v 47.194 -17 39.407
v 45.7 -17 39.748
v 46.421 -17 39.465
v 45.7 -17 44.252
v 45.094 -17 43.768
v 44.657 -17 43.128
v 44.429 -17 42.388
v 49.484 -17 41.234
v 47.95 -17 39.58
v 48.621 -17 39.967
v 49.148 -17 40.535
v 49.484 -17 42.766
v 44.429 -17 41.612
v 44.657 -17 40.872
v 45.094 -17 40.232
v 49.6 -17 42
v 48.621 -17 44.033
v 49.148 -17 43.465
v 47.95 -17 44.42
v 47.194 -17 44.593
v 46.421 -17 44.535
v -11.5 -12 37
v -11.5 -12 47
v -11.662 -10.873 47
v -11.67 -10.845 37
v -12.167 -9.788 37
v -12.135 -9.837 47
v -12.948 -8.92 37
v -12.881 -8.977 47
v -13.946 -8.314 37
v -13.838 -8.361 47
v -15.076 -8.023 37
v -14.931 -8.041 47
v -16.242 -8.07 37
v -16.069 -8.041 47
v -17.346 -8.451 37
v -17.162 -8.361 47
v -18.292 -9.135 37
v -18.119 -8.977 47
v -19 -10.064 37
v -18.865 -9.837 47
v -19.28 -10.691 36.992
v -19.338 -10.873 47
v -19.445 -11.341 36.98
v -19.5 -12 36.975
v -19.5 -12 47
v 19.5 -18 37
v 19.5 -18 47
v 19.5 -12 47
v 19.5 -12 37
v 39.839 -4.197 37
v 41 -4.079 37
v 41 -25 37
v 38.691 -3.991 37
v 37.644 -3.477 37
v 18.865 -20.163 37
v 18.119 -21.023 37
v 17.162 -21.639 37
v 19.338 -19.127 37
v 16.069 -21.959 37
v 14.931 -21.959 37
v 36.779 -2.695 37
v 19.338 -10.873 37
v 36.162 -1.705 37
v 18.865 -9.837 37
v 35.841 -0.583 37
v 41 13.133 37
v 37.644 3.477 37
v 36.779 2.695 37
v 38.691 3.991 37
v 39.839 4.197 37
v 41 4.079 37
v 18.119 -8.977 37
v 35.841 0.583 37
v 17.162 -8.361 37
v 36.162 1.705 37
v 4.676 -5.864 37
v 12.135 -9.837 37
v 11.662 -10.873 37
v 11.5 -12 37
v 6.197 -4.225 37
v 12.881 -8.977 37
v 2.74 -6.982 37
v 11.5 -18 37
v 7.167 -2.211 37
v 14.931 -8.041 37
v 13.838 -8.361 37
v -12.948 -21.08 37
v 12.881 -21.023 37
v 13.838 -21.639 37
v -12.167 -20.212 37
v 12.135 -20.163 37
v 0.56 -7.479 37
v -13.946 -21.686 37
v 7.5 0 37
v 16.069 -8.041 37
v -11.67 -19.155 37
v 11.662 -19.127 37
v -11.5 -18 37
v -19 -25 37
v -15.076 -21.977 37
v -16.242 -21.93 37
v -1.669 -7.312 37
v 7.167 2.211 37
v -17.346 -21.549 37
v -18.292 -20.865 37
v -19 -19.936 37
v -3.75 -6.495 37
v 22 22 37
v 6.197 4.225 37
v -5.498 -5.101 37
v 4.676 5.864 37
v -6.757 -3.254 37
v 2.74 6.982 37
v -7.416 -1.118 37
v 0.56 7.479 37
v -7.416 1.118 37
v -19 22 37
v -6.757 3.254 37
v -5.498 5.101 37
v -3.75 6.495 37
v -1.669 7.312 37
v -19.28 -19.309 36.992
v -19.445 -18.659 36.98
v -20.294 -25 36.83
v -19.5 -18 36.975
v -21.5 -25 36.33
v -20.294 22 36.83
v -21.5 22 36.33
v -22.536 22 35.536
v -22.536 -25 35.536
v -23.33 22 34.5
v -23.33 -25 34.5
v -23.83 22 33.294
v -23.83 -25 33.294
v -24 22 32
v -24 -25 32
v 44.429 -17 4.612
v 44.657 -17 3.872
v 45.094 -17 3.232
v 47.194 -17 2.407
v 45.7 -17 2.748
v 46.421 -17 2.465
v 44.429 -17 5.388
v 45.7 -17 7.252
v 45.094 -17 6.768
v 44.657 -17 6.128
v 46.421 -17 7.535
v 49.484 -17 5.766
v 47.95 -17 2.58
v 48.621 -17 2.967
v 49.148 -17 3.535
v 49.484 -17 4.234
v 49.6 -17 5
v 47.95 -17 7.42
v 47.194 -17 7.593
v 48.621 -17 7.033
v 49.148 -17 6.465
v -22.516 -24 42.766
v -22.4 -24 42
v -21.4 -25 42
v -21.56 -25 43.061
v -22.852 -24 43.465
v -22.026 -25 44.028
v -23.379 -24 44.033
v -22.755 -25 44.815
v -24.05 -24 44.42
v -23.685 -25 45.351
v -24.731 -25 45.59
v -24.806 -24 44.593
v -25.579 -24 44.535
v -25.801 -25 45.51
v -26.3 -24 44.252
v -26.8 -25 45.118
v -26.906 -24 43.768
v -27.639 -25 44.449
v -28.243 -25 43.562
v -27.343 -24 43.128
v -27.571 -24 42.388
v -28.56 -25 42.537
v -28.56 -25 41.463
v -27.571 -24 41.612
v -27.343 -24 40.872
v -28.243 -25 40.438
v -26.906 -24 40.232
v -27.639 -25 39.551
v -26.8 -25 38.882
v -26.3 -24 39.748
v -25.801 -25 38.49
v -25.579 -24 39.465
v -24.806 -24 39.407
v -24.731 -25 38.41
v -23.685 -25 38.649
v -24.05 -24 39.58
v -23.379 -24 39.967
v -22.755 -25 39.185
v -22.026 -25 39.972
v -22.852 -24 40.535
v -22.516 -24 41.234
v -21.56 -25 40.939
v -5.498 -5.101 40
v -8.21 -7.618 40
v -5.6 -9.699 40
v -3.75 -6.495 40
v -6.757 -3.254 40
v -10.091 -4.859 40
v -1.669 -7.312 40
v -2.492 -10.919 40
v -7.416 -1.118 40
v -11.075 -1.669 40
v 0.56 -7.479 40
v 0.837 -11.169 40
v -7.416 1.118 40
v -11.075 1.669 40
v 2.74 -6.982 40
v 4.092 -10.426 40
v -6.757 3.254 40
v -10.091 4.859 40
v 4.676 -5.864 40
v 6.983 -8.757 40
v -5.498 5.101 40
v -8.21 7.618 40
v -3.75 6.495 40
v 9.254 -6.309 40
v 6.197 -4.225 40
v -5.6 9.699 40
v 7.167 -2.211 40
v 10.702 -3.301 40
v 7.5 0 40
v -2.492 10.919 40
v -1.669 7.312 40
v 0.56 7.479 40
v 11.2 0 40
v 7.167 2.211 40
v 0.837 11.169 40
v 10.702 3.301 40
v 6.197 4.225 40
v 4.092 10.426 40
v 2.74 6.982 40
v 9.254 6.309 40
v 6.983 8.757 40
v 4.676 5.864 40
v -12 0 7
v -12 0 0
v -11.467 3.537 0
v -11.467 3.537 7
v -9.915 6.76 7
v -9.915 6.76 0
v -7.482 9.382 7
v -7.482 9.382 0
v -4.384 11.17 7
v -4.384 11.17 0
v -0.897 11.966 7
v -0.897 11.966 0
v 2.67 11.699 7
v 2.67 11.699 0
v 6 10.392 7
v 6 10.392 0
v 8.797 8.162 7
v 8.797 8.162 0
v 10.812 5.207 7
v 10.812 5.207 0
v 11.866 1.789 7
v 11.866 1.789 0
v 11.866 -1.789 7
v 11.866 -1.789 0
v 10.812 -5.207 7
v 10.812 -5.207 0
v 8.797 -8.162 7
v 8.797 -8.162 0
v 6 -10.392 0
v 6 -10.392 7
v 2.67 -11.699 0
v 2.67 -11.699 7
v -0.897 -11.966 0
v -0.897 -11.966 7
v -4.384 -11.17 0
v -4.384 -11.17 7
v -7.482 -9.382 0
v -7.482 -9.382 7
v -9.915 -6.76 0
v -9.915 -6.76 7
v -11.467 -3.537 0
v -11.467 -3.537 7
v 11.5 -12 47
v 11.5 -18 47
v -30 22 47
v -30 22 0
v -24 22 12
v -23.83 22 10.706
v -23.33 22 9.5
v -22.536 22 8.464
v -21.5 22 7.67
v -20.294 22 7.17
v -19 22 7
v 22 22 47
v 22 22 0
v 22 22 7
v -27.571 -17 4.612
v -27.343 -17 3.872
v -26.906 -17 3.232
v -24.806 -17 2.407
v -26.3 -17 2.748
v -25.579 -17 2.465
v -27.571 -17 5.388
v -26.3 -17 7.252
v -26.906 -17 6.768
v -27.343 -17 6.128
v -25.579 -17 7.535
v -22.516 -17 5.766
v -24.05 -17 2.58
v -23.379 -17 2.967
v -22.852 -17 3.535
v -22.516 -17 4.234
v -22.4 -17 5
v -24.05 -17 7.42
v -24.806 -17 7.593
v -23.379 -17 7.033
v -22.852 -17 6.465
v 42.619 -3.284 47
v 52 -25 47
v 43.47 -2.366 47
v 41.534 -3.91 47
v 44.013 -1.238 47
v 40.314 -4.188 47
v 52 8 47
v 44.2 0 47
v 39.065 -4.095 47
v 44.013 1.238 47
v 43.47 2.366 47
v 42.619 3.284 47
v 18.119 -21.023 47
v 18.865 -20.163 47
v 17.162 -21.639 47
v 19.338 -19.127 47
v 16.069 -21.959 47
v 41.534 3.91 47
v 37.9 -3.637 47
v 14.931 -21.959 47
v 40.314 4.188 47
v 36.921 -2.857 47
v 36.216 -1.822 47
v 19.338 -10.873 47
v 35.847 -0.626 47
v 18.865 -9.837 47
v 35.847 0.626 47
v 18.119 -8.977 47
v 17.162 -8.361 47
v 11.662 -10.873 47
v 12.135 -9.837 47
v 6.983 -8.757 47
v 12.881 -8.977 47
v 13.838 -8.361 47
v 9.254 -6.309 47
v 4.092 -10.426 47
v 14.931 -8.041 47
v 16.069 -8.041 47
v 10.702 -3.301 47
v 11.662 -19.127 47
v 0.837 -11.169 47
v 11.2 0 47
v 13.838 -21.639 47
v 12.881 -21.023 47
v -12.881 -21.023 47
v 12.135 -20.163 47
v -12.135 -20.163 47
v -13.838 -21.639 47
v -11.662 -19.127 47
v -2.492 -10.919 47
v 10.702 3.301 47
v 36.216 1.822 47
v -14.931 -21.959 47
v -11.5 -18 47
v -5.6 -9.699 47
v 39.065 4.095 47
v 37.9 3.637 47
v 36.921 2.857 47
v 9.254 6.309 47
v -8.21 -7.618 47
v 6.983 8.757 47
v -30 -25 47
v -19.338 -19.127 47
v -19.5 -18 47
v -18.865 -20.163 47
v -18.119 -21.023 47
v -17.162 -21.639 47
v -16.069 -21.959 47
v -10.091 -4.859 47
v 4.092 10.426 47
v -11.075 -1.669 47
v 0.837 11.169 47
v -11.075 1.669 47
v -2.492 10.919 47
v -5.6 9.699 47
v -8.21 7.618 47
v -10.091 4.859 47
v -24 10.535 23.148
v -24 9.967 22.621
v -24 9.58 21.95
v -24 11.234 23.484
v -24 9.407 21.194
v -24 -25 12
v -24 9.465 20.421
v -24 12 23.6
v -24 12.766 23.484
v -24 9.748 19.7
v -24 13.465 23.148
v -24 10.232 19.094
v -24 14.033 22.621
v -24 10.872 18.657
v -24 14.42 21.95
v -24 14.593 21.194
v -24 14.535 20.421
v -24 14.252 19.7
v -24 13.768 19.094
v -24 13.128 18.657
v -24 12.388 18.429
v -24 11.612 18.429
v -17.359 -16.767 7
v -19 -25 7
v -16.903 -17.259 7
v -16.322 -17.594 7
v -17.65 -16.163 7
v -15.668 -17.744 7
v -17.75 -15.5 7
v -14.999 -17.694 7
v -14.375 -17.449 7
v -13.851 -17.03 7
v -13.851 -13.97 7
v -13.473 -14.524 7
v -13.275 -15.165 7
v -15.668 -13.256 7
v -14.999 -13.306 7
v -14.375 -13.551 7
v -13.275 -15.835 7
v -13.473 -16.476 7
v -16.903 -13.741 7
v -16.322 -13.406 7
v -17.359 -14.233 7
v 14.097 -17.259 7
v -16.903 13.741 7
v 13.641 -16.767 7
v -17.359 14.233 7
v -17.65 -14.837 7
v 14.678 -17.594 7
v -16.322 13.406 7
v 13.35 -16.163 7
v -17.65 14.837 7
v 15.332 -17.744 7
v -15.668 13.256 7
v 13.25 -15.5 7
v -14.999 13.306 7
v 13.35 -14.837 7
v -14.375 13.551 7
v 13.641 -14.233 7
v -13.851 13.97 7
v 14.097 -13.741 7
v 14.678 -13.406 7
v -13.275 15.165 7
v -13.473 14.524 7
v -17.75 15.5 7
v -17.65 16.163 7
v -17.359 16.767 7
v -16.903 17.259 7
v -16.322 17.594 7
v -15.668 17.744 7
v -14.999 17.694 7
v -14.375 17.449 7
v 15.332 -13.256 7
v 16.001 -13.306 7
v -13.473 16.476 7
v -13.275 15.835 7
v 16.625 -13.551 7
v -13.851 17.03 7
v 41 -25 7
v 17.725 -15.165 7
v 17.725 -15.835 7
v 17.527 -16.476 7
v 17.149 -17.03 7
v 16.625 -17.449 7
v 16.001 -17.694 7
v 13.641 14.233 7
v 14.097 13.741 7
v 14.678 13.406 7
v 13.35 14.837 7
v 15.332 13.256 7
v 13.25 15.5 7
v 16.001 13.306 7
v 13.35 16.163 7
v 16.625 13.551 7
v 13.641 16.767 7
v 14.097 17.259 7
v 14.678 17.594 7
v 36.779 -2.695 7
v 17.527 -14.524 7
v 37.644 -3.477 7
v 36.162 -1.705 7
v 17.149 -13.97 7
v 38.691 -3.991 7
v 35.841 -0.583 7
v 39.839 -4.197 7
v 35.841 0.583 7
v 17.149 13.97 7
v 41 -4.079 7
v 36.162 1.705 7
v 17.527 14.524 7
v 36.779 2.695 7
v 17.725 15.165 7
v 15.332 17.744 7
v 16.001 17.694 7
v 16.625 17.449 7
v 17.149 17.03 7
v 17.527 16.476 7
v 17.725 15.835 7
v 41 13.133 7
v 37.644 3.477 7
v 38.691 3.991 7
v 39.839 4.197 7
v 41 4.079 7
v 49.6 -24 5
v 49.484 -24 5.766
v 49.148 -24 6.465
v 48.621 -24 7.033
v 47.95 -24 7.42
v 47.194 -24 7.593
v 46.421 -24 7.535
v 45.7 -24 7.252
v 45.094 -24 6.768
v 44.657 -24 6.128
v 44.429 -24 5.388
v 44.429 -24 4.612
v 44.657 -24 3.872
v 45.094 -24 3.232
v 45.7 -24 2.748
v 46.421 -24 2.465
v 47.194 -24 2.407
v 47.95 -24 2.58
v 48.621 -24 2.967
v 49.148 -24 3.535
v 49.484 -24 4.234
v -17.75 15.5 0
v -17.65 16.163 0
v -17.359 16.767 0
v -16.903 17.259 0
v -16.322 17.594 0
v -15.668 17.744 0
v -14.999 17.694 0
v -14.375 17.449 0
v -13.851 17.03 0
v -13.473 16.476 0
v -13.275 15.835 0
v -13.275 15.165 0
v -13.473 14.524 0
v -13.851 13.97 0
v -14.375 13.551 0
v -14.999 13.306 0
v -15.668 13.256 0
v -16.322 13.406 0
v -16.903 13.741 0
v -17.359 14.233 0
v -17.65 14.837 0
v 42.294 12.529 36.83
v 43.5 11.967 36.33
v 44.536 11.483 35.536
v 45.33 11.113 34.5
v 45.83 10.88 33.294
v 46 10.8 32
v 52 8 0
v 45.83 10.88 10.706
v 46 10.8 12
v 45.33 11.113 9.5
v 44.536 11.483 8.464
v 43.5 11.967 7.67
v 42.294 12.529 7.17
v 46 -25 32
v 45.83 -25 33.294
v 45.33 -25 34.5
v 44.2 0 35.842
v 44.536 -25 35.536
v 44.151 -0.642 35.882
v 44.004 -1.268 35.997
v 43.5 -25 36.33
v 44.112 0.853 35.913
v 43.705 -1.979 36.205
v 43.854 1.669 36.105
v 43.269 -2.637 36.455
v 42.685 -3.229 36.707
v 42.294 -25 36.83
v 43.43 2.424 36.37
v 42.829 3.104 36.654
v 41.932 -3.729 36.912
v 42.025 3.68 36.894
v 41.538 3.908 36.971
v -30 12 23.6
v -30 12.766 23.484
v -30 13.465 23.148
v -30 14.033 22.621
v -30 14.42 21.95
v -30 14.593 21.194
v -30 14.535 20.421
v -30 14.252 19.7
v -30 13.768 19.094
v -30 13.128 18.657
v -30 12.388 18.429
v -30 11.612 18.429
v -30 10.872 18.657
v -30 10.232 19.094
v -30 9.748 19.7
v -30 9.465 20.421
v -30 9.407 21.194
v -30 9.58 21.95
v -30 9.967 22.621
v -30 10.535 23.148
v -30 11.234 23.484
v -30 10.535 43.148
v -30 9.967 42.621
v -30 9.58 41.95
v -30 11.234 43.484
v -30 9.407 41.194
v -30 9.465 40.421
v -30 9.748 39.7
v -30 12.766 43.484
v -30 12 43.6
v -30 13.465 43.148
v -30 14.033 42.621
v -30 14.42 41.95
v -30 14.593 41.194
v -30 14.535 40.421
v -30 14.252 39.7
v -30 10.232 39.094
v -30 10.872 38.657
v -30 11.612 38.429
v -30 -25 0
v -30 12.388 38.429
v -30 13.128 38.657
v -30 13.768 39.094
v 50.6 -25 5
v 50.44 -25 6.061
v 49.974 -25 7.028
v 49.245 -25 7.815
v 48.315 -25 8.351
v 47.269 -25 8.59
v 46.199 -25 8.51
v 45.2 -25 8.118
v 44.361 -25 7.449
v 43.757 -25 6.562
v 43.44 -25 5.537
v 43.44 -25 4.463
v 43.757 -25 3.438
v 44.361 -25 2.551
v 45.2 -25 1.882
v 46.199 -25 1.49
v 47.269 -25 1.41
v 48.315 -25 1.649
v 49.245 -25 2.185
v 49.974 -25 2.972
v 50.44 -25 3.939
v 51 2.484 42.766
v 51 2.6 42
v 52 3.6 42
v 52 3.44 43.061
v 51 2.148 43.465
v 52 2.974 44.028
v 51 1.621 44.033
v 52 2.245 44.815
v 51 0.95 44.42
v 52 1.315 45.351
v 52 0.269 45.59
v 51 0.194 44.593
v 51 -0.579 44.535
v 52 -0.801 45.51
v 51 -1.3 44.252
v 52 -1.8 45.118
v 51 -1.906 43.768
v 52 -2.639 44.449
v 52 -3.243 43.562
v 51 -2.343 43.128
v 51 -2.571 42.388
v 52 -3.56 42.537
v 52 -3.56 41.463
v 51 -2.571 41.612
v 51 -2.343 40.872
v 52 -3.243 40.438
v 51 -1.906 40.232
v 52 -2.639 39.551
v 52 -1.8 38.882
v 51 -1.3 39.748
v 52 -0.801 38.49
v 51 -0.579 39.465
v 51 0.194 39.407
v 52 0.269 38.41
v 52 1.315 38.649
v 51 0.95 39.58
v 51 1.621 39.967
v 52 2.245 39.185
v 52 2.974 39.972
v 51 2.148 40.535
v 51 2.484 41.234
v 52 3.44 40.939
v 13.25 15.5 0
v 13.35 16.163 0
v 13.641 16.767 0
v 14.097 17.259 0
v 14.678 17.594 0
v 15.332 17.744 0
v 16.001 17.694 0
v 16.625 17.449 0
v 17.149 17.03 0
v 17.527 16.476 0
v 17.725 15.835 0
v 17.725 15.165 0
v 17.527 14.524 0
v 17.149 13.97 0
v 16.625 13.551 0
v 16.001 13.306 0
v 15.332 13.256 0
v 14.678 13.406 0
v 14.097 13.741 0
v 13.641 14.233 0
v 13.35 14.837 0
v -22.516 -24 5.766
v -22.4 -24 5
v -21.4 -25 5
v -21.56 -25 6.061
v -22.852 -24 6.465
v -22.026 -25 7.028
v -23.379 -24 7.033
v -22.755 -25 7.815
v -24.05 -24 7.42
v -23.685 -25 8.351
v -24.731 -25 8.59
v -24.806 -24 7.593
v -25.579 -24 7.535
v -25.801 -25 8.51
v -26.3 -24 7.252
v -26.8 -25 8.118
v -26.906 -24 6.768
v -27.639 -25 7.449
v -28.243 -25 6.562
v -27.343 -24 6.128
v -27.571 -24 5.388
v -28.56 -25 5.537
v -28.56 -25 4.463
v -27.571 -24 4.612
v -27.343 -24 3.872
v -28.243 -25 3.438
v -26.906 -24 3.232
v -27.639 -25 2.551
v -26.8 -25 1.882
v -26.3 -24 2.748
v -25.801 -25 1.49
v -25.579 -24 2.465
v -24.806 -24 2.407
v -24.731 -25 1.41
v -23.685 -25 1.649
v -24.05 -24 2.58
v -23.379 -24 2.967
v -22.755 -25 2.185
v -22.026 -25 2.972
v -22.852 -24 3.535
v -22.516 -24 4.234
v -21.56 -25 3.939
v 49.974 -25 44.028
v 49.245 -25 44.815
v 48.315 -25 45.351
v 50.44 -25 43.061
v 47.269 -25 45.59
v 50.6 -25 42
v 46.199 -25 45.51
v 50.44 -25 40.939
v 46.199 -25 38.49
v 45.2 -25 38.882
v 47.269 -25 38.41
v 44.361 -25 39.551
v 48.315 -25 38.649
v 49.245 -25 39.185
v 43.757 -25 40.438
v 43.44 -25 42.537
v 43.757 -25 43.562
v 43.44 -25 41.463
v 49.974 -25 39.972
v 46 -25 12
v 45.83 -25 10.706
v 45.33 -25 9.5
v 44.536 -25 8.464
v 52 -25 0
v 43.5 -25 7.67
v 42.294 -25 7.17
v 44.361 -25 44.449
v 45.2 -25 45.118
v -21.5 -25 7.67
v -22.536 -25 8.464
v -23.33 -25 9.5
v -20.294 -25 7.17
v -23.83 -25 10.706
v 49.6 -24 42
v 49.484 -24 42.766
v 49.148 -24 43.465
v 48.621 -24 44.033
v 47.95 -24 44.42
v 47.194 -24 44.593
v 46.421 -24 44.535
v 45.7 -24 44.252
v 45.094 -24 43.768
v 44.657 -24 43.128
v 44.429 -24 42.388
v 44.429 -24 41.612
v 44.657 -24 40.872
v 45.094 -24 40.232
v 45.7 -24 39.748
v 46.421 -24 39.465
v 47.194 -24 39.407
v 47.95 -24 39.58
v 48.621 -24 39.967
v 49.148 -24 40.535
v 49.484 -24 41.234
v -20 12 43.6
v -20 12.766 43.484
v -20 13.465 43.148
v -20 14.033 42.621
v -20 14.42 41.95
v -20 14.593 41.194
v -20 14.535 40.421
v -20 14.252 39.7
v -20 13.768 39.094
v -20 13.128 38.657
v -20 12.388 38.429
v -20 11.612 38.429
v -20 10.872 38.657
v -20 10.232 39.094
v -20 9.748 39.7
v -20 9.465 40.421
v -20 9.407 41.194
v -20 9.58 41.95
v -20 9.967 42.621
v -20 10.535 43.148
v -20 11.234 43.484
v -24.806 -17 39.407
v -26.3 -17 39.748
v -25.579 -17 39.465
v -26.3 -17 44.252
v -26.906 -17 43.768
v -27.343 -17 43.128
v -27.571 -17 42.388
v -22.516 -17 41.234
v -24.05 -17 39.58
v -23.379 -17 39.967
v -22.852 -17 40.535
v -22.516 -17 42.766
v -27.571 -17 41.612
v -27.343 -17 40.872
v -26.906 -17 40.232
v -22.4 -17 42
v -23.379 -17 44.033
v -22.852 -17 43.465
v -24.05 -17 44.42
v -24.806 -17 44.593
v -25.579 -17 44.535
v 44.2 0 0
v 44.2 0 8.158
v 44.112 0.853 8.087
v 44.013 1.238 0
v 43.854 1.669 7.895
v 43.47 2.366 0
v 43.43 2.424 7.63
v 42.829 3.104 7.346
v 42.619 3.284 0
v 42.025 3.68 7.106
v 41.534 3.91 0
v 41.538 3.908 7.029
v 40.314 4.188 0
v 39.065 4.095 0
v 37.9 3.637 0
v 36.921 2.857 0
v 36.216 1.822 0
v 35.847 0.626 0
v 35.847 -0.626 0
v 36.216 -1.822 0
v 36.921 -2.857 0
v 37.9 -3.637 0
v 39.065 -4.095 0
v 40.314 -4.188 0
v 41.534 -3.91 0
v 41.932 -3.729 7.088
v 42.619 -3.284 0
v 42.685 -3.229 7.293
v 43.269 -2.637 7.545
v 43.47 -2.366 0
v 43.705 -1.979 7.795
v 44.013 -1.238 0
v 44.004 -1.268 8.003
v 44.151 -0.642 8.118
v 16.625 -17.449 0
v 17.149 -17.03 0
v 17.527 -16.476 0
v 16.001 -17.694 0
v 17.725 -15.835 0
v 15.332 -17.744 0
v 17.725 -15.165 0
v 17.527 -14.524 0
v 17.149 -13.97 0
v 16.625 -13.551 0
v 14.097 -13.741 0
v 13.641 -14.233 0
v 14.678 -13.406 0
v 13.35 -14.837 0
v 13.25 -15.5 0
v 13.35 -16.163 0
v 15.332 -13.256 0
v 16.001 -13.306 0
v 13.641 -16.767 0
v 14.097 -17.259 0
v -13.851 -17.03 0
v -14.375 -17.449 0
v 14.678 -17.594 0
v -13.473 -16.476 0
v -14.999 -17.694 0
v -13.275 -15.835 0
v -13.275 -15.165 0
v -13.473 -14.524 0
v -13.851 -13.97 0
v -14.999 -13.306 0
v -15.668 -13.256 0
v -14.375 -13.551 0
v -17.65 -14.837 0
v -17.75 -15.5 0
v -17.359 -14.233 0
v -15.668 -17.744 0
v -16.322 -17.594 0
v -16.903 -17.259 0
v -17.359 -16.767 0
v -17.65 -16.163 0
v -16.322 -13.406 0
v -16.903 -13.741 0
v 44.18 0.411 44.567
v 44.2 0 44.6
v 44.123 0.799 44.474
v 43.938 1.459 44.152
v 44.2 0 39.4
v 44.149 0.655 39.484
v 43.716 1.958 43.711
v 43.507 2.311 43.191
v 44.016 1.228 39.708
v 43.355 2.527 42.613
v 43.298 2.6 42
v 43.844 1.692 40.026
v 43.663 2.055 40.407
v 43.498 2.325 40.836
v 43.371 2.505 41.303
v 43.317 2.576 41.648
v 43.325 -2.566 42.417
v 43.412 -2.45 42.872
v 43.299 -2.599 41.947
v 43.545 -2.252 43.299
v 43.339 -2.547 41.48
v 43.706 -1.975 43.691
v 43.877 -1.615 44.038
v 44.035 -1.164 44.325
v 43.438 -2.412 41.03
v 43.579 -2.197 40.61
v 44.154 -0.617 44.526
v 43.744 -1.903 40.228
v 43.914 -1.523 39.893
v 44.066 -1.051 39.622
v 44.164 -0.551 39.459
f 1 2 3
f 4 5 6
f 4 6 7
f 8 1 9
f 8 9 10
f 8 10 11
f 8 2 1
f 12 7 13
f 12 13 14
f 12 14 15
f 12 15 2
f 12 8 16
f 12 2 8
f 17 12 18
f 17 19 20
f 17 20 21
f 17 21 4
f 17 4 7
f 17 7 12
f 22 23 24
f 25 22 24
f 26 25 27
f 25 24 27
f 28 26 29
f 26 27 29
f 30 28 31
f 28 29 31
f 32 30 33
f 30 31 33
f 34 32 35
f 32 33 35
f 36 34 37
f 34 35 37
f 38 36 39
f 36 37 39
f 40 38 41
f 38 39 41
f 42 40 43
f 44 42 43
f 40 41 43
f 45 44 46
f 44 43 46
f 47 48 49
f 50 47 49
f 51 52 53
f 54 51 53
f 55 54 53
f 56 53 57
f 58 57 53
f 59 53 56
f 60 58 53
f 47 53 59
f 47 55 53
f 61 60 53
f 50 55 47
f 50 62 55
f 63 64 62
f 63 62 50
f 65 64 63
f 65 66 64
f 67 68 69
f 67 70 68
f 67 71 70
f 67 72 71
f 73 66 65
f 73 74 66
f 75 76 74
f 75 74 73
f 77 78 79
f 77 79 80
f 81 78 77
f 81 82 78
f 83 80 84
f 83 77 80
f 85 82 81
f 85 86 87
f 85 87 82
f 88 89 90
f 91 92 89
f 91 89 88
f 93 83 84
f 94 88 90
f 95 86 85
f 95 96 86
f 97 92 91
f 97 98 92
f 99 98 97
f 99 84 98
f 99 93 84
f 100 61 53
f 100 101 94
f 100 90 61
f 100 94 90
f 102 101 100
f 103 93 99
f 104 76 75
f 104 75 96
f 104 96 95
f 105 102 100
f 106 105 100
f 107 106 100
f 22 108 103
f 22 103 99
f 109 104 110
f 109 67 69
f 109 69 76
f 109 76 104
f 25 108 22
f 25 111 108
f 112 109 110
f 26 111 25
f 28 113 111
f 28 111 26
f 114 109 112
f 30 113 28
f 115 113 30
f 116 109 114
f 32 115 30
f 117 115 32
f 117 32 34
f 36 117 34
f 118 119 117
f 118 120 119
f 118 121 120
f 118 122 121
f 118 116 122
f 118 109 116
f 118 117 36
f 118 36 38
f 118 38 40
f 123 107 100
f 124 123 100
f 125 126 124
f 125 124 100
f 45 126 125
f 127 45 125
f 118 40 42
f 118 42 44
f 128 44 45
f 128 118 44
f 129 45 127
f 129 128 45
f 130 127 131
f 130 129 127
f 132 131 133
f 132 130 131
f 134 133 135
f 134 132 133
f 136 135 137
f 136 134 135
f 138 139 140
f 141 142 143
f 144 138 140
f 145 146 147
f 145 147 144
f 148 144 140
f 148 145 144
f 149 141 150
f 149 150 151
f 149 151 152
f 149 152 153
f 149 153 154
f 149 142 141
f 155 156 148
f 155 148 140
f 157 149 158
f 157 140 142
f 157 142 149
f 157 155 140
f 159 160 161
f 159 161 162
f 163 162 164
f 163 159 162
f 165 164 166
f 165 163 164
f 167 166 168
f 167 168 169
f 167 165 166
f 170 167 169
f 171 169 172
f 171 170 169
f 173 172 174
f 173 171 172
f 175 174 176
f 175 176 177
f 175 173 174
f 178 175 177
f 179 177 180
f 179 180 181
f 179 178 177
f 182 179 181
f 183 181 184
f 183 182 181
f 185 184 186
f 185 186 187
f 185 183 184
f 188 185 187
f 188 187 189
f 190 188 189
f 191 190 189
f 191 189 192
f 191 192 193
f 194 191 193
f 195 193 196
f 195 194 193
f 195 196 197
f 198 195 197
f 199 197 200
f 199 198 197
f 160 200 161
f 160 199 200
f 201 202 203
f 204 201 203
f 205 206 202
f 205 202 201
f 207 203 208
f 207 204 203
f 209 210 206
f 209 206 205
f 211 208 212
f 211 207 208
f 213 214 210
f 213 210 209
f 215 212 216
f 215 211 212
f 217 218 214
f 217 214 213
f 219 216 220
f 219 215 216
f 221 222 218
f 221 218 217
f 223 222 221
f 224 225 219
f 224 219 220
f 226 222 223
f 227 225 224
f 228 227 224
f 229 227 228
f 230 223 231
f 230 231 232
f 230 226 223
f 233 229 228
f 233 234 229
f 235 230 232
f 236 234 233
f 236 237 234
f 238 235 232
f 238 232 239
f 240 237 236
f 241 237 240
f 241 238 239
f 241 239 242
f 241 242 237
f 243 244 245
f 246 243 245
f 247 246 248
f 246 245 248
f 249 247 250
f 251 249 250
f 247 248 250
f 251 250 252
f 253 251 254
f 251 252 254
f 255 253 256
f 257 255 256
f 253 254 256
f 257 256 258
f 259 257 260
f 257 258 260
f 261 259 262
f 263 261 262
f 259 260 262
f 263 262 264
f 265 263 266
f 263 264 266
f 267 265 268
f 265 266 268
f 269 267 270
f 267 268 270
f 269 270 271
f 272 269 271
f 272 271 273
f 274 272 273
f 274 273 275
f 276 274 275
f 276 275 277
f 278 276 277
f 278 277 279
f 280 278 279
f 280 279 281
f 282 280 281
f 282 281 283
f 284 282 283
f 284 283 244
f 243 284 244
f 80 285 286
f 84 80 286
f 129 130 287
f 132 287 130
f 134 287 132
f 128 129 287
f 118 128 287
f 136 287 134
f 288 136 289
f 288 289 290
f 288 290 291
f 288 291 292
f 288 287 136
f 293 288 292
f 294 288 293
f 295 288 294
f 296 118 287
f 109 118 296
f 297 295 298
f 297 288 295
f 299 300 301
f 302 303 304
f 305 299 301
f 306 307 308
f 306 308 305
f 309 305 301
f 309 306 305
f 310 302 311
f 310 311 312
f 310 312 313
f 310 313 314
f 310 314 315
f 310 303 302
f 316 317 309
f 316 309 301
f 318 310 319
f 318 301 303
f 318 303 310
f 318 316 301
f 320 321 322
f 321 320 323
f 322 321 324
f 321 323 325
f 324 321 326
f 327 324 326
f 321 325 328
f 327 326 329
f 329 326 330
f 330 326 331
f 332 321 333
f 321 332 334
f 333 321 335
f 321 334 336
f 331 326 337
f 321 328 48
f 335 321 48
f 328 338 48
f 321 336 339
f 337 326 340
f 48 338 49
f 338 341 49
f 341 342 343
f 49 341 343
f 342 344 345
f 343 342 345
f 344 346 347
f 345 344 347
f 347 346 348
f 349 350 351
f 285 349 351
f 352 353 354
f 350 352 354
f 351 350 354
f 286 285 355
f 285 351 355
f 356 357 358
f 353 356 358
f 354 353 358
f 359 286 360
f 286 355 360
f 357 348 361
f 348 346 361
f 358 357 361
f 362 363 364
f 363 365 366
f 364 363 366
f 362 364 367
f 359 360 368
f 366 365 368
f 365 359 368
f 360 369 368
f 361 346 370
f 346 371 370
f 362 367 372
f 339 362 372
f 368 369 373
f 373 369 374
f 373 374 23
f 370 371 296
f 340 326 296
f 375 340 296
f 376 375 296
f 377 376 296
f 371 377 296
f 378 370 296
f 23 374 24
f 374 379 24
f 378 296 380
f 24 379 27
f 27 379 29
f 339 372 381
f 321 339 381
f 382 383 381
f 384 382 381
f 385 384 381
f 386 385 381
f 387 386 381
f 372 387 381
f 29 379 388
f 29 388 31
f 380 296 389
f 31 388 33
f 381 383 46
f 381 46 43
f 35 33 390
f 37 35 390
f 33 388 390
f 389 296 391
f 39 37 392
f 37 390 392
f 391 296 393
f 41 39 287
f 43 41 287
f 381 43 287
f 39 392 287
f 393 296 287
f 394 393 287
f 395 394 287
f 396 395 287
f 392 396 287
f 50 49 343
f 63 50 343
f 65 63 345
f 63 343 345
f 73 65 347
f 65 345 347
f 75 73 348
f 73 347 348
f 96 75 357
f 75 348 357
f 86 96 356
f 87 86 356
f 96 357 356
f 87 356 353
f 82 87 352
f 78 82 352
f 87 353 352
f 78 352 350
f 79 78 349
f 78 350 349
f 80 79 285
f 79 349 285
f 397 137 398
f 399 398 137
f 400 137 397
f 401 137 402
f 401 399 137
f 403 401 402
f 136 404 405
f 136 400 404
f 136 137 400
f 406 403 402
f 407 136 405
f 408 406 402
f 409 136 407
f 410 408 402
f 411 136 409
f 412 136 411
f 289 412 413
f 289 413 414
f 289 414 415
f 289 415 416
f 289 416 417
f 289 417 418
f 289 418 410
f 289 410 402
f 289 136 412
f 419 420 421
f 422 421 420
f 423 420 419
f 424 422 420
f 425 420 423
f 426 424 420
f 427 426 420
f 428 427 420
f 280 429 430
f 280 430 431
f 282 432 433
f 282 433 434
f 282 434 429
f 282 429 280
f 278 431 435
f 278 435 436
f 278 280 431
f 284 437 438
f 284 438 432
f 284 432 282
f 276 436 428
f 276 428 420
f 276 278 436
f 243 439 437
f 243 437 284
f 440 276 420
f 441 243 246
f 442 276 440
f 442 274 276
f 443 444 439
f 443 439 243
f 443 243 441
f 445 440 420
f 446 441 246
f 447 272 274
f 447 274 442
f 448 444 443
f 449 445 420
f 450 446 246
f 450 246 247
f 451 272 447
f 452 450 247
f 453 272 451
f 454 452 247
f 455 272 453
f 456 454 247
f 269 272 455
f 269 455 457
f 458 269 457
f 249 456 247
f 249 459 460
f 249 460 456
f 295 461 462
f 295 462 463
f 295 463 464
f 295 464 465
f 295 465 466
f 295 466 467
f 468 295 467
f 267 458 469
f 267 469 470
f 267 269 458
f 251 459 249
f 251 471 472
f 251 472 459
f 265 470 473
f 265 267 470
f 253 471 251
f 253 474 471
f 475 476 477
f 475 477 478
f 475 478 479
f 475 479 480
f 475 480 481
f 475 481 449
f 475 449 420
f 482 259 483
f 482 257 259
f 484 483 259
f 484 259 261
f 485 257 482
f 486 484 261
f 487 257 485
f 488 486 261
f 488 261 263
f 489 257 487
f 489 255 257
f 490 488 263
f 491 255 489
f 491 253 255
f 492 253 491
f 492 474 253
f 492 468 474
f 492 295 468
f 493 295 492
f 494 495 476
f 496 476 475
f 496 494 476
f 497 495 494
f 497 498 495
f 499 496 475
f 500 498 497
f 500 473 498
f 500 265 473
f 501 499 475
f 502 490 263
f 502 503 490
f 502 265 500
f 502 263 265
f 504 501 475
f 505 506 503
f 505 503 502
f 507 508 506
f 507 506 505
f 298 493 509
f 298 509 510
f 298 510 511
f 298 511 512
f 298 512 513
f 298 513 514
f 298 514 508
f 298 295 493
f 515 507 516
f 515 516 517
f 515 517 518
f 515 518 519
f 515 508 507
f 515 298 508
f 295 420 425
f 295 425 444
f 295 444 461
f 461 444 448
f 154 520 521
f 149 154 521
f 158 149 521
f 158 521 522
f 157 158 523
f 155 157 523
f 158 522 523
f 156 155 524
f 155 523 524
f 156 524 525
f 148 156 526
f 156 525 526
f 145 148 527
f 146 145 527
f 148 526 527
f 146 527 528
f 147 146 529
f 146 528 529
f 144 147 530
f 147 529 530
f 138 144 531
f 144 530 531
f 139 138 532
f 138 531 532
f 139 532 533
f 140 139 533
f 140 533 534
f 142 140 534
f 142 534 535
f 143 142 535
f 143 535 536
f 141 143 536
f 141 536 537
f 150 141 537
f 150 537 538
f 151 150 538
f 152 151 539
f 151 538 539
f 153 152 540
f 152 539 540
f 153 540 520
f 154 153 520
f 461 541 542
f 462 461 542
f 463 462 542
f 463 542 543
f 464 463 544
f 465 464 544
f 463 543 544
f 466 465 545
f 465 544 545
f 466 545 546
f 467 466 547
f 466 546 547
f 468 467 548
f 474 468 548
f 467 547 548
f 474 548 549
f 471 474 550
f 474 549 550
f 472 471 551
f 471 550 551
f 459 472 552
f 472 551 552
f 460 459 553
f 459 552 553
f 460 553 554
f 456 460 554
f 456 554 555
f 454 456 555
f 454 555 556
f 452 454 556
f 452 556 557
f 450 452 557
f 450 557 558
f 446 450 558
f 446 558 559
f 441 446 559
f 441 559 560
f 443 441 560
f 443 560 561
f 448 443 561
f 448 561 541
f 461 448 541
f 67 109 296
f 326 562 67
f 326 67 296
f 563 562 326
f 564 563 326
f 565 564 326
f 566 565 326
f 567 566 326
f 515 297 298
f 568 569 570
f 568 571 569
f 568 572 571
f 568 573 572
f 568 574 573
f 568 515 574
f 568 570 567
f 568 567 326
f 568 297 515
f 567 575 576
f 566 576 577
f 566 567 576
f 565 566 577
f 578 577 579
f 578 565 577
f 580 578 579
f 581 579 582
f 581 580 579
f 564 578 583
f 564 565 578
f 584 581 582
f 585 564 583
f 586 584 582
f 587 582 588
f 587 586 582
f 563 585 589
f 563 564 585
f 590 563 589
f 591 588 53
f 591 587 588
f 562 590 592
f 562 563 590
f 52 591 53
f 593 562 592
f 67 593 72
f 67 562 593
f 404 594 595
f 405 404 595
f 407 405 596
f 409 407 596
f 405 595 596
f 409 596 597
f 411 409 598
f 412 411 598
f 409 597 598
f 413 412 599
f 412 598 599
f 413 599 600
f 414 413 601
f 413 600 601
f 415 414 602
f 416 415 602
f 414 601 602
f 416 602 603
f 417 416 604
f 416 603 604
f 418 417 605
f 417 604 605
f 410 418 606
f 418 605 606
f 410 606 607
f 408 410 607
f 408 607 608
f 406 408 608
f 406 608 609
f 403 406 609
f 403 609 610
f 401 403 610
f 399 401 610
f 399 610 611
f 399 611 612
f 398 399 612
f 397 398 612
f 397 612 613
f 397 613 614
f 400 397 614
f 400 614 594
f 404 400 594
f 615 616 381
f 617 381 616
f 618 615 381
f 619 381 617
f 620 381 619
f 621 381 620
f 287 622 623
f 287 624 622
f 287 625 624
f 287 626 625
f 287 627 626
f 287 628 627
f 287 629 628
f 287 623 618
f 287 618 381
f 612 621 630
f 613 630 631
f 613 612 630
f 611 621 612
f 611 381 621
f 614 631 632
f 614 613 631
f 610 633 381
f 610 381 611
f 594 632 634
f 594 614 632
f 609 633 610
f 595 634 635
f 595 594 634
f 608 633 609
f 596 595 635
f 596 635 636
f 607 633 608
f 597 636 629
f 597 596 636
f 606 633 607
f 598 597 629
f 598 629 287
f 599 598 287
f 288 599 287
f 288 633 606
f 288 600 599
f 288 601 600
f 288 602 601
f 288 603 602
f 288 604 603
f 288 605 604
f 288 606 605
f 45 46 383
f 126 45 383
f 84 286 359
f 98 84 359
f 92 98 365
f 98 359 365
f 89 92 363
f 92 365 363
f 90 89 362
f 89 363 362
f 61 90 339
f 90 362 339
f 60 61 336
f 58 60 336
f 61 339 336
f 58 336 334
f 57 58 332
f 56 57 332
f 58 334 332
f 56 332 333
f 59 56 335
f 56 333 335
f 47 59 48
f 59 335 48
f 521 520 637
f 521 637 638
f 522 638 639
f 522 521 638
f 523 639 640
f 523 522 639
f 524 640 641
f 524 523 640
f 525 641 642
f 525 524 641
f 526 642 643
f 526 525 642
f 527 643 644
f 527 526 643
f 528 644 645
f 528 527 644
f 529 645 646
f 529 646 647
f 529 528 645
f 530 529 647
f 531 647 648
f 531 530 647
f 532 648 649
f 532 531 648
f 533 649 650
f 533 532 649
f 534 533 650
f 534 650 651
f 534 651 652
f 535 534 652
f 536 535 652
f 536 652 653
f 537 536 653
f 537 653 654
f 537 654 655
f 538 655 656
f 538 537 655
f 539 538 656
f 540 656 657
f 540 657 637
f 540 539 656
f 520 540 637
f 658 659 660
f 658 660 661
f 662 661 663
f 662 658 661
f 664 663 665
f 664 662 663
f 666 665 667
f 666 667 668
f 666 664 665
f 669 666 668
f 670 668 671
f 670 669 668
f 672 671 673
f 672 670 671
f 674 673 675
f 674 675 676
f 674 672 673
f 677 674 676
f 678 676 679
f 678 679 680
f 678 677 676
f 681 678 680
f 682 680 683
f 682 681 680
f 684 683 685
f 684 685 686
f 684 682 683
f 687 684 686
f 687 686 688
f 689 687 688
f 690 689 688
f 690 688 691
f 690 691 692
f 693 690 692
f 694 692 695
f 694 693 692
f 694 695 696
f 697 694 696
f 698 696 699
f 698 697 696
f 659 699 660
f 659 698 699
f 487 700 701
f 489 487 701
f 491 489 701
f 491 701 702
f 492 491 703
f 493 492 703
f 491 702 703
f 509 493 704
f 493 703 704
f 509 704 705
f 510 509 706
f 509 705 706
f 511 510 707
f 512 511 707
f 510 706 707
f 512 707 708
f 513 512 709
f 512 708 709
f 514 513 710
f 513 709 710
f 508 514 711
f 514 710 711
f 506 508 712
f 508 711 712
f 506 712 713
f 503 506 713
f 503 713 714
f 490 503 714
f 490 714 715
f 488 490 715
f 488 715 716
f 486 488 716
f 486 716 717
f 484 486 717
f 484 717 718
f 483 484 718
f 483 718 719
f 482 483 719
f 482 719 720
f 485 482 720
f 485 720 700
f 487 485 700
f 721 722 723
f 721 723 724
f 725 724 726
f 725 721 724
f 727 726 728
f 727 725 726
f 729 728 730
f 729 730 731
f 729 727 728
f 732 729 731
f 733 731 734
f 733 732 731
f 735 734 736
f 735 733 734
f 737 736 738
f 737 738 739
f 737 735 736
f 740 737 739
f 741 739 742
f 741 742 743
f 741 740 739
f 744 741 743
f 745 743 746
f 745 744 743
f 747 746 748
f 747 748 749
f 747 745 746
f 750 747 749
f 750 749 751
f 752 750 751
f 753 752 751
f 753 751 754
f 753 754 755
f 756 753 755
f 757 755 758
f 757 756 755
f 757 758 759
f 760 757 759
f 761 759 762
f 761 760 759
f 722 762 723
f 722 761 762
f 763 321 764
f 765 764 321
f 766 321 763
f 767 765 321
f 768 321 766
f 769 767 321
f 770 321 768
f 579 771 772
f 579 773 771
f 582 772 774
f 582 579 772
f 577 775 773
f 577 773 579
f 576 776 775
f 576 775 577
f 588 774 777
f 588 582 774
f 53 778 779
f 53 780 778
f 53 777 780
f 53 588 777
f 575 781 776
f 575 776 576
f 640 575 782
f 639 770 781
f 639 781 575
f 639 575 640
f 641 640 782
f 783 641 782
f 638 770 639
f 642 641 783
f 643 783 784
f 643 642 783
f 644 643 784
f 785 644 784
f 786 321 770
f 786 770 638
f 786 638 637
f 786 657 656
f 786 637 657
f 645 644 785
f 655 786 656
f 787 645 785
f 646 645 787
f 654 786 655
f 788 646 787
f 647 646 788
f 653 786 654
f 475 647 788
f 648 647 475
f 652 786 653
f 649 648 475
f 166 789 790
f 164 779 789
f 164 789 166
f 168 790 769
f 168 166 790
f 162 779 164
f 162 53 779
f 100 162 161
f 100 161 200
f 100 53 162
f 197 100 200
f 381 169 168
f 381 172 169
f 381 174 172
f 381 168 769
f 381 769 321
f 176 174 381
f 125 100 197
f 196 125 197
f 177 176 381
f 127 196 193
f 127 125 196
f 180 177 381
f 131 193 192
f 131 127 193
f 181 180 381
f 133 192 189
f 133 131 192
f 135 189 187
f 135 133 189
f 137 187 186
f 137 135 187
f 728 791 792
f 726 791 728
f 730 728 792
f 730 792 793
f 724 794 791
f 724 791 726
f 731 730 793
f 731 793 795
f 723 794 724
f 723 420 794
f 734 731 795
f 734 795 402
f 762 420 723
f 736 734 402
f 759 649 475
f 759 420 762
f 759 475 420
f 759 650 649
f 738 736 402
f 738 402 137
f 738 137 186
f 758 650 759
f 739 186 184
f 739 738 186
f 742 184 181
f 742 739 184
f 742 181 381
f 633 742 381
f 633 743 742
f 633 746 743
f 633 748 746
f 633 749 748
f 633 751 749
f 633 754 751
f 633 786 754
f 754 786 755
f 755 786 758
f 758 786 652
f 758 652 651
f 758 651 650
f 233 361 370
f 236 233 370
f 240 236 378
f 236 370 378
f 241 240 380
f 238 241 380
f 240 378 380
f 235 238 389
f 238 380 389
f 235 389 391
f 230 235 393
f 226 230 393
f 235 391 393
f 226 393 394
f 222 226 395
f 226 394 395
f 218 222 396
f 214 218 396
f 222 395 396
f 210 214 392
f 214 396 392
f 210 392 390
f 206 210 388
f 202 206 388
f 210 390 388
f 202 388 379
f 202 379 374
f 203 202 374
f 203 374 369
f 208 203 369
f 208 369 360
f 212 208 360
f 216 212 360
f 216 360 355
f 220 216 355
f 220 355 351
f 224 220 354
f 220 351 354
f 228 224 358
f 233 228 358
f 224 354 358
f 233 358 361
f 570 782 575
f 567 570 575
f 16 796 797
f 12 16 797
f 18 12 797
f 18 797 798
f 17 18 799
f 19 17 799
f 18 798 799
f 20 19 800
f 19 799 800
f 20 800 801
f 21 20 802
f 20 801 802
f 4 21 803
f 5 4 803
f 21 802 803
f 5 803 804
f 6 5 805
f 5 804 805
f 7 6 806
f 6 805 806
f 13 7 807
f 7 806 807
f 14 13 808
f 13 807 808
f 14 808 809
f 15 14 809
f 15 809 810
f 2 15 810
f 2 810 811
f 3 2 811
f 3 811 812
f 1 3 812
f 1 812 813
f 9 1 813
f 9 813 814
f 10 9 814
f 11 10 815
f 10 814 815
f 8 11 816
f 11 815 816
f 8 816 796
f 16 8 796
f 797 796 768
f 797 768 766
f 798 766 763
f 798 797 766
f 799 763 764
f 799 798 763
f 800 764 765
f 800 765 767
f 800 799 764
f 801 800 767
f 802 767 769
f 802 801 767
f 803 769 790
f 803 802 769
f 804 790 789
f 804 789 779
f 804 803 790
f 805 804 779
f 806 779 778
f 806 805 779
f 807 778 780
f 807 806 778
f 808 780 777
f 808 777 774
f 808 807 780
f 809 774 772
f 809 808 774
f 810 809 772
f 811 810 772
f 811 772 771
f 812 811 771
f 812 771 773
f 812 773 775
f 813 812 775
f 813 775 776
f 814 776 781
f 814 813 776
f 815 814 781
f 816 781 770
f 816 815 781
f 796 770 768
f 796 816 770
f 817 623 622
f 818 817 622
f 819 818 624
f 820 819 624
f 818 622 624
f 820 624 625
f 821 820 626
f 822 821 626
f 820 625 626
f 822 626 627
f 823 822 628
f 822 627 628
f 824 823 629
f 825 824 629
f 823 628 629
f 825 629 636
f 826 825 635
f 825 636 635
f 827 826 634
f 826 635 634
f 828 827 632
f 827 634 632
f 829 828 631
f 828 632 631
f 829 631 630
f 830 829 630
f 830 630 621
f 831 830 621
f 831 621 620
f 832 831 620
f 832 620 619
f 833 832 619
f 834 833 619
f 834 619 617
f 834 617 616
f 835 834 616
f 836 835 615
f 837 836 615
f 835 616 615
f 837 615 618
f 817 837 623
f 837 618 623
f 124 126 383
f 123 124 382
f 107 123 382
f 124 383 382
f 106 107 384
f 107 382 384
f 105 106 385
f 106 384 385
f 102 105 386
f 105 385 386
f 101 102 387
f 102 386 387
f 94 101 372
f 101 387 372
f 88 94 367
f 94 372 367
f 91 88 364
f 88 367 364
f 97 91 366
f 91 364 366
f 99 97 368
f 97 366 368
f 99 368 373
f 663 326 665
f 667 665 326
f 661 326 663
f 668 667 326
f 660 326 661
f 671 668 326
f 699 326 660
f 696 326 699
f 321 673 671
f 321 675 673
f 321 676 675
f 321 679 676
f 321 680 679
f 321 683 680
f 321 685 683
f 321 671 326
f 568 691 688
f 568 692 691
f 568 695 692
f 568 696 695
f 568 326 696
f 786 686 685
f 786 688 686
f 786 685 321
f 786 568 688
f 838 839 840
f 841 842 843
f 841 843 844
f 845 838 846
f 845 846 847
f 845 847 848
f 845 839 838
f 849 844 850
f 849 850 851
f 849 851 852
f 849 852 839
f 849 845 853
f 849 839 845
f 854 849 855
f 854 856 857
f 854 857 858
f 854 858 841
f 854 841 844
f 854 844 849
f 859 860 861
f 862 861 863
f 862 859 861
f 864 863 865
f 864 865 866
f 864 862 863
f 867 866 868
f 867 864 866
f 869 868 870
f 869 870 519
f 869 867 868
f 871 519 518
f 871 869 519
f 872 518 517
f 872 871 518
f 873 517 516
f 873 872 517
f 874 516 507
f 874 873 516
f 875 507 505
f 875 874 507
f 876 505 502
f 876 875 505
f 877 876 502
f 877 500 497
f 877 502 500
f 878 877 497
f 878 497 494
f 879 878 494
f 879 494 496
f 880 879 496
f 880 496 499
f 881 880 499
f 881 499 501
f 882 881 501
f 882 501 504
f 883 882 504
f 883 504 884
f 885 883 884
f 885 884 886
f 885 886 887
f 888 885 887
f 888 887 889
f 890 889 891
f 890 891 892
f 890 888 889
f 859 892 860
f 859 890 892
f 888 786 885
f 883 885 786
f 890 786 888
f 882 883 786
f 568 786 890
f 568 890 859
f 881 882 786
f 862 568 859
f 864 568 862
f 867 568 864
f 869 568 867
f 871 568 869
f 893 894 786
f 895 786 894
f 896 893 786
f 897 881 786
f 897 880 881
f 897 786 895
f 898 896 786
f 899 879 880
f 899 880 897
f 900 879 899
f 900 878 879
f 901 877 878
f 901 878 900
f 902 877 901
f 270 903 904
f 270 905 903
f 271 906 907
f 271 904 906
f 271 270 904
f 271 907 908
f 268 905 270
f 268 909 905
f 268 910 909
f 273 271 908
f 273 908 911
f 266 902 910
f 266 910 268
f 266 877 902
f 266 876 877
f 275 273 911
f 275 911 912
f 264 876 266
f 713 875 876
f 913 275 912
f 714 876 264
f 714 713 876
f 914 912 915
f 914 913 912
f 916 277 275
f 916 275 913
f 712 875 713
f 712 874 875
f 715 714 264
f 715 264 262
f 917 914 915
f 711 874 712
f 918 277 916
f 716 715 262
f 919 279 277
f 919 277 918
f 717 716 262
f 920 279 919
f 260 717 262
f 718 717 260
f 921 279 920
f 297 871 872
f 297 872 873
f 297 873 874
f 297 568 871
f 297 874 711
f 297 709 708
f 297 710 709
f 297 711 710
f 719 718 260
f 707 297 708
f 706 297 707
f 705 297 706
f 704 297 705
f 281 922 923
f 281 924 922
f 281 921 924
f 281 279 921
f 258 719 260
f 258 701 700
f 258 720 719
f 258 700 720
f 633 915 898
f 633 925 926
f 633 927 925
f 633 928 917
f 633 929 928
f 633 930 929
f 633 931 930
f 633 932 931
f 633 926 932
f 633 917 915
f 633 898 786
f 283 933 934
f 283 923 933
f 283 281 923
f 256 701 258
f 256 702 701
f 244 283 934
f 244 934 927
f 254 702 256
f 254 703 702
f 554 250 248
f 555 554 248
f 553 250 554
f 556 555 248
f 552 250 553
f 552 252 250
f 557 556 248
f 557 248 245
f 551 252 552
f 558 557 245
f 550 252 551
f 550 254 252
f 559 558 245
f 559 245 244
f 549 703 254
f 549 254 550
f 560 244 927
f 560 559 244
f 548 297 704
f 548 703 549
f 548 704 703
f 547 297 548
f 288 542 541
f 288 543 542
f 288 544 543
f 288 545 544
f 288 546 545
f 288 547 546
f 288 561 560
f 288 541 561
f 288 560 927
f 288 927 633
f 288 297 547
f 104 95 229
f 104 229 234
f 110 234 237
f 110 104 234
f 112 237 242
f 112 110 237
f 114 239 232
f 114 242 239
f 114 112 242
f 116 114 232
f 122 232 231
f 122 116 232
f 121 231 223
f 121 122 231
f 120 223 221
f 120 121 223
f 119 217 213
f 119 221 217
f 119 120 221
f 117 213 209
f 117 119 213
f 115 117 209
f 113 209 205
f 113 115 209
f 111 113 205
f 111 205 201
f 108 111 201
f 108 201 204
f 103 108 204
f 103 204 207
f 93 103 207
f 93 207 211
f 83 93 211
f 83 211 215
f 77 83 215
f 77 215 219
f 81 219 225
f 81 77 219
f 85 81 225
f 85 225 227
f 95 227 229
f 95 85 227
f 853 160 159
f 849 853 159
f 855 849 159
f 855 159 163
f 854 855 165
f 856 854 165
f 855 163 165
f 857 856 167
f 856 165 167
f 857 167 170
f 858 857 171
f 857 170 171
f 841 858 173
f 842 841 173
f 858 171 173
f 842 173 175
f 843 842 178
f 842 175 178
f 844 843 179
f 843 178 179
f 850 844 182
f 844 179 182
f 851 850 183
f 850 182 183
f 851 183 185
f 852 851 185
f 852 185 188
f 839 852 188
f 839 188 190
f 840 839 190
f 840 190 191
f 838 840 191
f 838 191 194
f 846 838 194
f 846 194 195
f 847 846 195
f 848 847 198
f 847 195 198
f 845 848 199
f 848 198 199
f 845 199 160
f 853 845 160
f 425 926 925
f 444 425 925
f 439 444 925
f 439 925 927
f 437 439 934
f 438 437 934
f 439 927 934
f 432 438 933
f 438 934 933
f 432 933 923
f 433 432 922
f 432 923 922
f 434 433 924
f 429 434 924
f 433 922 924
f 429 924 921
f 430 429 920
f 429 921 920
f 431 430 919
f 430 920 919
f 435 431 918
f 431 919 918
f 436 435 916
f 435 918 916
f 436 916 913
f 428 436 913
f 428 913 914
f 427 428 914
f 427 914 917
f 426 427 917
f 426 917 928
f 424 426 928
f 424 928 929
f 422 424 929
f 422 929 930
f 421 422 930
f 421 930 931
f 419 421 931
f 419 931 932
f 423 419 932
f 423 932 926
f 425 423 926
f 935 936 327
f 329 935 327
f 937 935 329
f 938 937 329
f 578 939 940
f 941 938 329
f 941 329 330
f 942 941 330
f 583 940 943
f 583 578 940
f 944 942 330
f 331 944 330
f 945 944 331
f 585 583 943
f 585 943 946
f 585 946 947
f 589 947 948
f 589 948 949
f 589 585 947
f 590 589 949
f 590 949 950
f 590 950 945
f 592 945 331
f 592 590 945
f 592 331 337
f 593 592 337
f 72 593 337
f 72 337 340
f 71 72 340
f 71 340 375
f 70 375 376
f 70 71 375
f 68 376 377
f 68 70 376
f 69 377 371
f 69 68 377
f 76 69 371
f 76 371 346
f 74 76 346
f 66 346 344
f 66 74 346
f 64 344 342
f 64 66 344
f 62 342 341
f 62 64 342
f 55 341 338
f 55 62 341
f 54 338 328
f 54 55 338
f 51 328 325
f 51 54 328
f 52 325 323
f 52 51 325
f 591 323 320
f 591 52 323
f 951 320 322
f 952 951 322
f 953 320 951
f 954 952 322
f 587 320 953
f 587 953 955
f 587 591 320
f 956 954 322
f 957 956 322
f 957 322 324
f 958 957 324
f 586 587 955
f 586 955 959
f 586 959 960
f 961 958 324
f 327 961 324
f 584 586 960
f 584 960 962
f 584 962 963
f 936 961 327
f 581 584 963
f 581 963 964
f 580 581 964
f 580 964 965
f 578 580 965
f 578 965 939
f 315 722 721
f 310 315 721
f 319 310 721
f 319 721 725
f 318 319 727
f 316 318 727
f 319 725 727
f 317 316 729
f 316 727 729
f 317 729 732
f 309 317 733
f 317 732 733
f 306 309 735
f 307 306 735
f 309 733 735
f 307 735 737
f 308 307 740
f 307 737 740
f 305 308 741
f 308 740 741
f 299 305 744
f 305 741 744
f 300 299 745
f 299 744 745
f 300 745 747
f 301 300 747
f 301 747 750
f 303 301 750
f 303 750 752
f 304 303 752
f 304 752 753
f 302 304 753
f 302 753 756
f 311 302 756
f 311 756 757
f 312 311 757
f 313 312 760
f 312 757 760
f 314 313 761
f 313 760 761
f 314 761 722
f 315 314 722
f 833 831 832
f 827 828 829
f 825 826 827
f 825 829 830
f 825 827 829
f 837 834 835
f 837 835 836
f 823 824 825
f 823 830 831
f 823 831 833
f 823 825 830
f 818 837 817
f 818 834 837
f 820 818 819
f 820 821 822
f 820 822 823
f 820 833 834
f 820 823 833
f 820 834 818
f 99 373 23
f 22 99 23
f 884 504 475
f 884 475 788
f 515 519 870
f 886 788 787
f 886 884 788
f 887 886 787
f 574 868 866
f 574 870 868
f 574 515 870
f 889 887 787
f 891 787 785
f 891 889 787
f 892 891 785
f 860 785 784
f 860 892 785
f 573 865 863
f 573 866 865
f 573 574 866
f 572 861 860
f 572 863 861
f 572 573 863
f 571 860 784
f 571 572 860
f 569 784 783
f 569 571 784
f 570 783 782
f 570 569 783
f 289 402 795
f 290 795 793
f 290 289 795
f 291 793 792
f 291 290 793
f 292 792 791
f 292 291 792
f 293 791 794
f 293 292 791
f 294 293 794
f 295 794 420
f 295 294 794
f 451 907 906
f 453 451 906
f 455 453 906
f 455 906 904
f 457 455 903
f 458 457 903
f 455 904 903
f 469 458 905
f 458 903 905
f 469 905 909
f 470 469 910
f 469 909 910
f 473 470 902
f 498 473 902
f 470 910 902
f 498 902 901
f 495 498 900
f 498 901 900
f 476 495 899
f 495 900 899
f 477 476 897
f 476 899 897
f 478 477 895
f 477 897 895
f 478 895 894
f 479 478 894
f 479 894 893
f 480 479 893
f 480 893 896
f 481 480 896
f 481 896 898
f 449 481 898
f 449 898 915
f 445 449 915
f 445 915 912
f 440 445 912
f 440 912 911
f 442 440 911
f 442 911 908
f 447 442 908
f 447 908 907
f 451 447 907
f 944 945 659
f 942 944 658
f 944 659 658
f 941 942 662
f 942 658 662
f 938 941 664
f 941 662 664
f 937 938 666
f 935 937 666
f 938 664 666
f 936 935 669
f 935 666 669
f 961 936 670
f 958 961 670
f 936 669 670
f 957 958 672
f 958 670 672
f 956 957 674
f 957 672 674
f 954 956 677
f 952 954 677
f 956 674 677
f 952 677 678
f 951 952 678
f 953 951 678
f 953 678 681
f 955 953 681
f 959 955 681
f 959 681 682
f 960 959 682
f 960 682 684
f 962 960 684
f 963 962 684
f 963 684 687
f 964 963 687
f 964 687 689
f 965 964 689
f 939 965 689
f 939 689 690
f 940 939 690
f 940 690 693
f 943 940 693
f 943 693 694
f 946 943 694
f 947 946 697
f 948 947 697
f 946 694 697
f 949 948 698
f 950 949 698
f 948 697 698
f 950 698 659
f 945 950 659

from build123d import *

# Parameters (mm, degrees)
SKETCH1_R           = 7.5
SKETCH1_R_2         = 4.2
BOSS_EXTRUDE1_DEPTH = 47
SKETCH2_R           = 11.2
CUT_EXTRUDE1_DEPTH  = 7
SKETCH3_R           = 2.25
SKETCH3_R_2         = 12
CUT_EXTRUDE2_DEPTH  = 15
CUT_EXTRUDE3_DEPTH  = 48
CUT_EXTRUDE4_DEPTH  = 20
SKETCH7_R           = 2.6
CUT_EXTRUDE5_DEPTH  = 10
SKETCH8_R           = 2.6
CUT_EXTRUDE6_DEPTH  = 8
CHAMFER1_SIZE       = 1
SKETCH9_R           = 2.6
CUT_EXTRUDE7_DEPTH  = 10
CHAMFER2_SIZE       = 1


with BuildPart() as part:
    # Sketch1 → Boss-Extrude1 (new body)
    with BuildSketch(Plane.XY):
        Polygon((-30, -25), (-30, 22), (22, 22), (52, 8), (52, -25), align=None)
        Circle(SKETCH1_R, mode=Mode.SUBTRACT)
        with Locations((40, 0)):
            Circle(SKETCH1_R_2, mode=Mode.SUBTRACT)
    extrude(amount=BOSS_EXTRUDE1_DEPTH)

    # Sketch2 → Cut-Extrude1 (cut)
    with BuildSketch(Plane.XY.offset(47)):
        Circle(SKETCH2_R)
    extrude(amount=-CUT_EXTRUDE1_DEPTH, mode=Mode.SUBTRACT)

    # Sketch3 → Cut-Extrude2 (cut)
    with BuildSketch(Plane(origin=(0, 0, 0), x_dir=(-1, 0, 0), z_dir=(0, 0, -1))):
        with Locations((-15.5, 15.5)):
            Circle(SKETCH3_R)
        with Locations((-15.5, -15.5)):
            Circle(SKETCH3_R)
        with Locations((15.5, -15.5)):
            Circle(SKETCH3_R)
        with Locations((15.5, 15.5)):
            Circle(SKETCH3_R)
        Circle(SKETCH3_R_2)
    extrude(amount=-CUT_EXTRUDE2_DEPTH, mode=Mode.SUBTRACT)

    # Sketch4 → Cut-Extrude3 (cut, through all)
    with BuildSketch(Plane(origin=(0, 22, 0), x_dir=(1, 0, 0), z_dir=(0, 1, 0))):
        with BuildLine():
            Line((-19, -7), (41, -7))
            ThreePointArc((41, -7), (44.535533906, -8.464466094), (46, -12))
            Line((46, -12), (46, -32))
            ThreePointArc((46, -32), (44.535533906, -35.535533906), (41, -37))
            Line((41, -37), (-19, -37))
            ThreePointArc((-19, -37), (-22.535533906, -35.535533906), (-24, -32))
            Line((-24, -32), (-24, -12))
            ThreePointArc((-24, -12), (-22.535533906, -8.464466094), (-19, -7))
        make_face()
    extrude(amount=-CUT_EXTRUDE3_DEPTH, mode=Mode.SUBTRACT)

    # Sketch6 → Cut-Extrude4 (cut)
    with BuildSketch(Plane.XY.offset(47)):
        with BuildLine():
            Line((-19.5, -12), (-19.5, -18))
            ThreePointArc((-19.5, -18), (-15.5, -22), (-11.5, -18))
            Line((-11.5, -18), (-11.5, -12))
            ThreePointArc((-11.5, -12), (-15.5, -8), (-19.5, -12))
        make_face()
        with BuildLine():
            Line((11.5, -12), (11.5, -18))
            ThreePointArc((11.5, -18), (15.5, -22), (19.5, -18))
            Line((19.5, -18), (19.5, -12))
            ThreePointArc((19.5, -12), (15.5, -8), (11.5, -12))
        make_face()
    extrude(amount=-CUT_EXTRUDE4_DEPTH, mode=Mode.SUBTRACT)

    # Sketch7 → Cut-Extrude5 (cut)
    with BuildSketch(Plane(origin=(52, 0, 0), x_dir=(0, 0, -1), z_dir=(1, 0, 0))):
        with Locations(Location((-42, 0, 0), (0, 0, 90))):  # turned: the seam where the file's is
            Circle(SKETCH7_R)
    extrude(amount=-CUT_EXTRUDE5_DEPTH, mode=Mode.SUBTRACT)

    # Sketch8 → Cut-Extrude6 (cut)
    with BuildSketch(Plane.XZ.offset(25)):
        with Locations((-25, 42)):
            Circle(SKETCH8_R)
        with Locations((-25, 5)):
            Circle(SKETCH8_R)
        with Locations((47, 5)):
            Circle(SKETCH8_R)
        with Locations((47, 42)):
            Circle(SKETCH8_R)
    extrude(amount=-CUT_EXTRUDE6_DEPTH, mode=Mode.SUBTRACT)

    # Chamfer1
    chamfer1_edges = [part.edges().sort_by_distance(p)[0] for p in [
        (-27.6, -25, 42),
        (-27.6, -25, 5),
        (44.4, -25, 5),
        (44.4, -25, 42),
    ]]
    chamfer(chamfer1_edges, length=CHAMFER1_SIZE)

    # Sketch9 → Cut-Extrude7 (cut)
    with BuildSketch(Plane.ZY.offset(30)):
        with Locations((41, 12)):
            Circle(SKETCH9_R)
        with Locations((21, 12)):
            Circle(SKETCH9_R)
    extrude(amount=-CUT_EXTRUDE7_DEPTH, mode=Mode.SUBTRACT)

    # Chamfer2
    chamfer2_edges = [part.edges().sort_by_distance(p)[0] for p in [
        (52, -2.6, 42),
    ]]
    chamfer(chamfer2_edges, length=CHAMFER2_SIZE)


solid = part.part
